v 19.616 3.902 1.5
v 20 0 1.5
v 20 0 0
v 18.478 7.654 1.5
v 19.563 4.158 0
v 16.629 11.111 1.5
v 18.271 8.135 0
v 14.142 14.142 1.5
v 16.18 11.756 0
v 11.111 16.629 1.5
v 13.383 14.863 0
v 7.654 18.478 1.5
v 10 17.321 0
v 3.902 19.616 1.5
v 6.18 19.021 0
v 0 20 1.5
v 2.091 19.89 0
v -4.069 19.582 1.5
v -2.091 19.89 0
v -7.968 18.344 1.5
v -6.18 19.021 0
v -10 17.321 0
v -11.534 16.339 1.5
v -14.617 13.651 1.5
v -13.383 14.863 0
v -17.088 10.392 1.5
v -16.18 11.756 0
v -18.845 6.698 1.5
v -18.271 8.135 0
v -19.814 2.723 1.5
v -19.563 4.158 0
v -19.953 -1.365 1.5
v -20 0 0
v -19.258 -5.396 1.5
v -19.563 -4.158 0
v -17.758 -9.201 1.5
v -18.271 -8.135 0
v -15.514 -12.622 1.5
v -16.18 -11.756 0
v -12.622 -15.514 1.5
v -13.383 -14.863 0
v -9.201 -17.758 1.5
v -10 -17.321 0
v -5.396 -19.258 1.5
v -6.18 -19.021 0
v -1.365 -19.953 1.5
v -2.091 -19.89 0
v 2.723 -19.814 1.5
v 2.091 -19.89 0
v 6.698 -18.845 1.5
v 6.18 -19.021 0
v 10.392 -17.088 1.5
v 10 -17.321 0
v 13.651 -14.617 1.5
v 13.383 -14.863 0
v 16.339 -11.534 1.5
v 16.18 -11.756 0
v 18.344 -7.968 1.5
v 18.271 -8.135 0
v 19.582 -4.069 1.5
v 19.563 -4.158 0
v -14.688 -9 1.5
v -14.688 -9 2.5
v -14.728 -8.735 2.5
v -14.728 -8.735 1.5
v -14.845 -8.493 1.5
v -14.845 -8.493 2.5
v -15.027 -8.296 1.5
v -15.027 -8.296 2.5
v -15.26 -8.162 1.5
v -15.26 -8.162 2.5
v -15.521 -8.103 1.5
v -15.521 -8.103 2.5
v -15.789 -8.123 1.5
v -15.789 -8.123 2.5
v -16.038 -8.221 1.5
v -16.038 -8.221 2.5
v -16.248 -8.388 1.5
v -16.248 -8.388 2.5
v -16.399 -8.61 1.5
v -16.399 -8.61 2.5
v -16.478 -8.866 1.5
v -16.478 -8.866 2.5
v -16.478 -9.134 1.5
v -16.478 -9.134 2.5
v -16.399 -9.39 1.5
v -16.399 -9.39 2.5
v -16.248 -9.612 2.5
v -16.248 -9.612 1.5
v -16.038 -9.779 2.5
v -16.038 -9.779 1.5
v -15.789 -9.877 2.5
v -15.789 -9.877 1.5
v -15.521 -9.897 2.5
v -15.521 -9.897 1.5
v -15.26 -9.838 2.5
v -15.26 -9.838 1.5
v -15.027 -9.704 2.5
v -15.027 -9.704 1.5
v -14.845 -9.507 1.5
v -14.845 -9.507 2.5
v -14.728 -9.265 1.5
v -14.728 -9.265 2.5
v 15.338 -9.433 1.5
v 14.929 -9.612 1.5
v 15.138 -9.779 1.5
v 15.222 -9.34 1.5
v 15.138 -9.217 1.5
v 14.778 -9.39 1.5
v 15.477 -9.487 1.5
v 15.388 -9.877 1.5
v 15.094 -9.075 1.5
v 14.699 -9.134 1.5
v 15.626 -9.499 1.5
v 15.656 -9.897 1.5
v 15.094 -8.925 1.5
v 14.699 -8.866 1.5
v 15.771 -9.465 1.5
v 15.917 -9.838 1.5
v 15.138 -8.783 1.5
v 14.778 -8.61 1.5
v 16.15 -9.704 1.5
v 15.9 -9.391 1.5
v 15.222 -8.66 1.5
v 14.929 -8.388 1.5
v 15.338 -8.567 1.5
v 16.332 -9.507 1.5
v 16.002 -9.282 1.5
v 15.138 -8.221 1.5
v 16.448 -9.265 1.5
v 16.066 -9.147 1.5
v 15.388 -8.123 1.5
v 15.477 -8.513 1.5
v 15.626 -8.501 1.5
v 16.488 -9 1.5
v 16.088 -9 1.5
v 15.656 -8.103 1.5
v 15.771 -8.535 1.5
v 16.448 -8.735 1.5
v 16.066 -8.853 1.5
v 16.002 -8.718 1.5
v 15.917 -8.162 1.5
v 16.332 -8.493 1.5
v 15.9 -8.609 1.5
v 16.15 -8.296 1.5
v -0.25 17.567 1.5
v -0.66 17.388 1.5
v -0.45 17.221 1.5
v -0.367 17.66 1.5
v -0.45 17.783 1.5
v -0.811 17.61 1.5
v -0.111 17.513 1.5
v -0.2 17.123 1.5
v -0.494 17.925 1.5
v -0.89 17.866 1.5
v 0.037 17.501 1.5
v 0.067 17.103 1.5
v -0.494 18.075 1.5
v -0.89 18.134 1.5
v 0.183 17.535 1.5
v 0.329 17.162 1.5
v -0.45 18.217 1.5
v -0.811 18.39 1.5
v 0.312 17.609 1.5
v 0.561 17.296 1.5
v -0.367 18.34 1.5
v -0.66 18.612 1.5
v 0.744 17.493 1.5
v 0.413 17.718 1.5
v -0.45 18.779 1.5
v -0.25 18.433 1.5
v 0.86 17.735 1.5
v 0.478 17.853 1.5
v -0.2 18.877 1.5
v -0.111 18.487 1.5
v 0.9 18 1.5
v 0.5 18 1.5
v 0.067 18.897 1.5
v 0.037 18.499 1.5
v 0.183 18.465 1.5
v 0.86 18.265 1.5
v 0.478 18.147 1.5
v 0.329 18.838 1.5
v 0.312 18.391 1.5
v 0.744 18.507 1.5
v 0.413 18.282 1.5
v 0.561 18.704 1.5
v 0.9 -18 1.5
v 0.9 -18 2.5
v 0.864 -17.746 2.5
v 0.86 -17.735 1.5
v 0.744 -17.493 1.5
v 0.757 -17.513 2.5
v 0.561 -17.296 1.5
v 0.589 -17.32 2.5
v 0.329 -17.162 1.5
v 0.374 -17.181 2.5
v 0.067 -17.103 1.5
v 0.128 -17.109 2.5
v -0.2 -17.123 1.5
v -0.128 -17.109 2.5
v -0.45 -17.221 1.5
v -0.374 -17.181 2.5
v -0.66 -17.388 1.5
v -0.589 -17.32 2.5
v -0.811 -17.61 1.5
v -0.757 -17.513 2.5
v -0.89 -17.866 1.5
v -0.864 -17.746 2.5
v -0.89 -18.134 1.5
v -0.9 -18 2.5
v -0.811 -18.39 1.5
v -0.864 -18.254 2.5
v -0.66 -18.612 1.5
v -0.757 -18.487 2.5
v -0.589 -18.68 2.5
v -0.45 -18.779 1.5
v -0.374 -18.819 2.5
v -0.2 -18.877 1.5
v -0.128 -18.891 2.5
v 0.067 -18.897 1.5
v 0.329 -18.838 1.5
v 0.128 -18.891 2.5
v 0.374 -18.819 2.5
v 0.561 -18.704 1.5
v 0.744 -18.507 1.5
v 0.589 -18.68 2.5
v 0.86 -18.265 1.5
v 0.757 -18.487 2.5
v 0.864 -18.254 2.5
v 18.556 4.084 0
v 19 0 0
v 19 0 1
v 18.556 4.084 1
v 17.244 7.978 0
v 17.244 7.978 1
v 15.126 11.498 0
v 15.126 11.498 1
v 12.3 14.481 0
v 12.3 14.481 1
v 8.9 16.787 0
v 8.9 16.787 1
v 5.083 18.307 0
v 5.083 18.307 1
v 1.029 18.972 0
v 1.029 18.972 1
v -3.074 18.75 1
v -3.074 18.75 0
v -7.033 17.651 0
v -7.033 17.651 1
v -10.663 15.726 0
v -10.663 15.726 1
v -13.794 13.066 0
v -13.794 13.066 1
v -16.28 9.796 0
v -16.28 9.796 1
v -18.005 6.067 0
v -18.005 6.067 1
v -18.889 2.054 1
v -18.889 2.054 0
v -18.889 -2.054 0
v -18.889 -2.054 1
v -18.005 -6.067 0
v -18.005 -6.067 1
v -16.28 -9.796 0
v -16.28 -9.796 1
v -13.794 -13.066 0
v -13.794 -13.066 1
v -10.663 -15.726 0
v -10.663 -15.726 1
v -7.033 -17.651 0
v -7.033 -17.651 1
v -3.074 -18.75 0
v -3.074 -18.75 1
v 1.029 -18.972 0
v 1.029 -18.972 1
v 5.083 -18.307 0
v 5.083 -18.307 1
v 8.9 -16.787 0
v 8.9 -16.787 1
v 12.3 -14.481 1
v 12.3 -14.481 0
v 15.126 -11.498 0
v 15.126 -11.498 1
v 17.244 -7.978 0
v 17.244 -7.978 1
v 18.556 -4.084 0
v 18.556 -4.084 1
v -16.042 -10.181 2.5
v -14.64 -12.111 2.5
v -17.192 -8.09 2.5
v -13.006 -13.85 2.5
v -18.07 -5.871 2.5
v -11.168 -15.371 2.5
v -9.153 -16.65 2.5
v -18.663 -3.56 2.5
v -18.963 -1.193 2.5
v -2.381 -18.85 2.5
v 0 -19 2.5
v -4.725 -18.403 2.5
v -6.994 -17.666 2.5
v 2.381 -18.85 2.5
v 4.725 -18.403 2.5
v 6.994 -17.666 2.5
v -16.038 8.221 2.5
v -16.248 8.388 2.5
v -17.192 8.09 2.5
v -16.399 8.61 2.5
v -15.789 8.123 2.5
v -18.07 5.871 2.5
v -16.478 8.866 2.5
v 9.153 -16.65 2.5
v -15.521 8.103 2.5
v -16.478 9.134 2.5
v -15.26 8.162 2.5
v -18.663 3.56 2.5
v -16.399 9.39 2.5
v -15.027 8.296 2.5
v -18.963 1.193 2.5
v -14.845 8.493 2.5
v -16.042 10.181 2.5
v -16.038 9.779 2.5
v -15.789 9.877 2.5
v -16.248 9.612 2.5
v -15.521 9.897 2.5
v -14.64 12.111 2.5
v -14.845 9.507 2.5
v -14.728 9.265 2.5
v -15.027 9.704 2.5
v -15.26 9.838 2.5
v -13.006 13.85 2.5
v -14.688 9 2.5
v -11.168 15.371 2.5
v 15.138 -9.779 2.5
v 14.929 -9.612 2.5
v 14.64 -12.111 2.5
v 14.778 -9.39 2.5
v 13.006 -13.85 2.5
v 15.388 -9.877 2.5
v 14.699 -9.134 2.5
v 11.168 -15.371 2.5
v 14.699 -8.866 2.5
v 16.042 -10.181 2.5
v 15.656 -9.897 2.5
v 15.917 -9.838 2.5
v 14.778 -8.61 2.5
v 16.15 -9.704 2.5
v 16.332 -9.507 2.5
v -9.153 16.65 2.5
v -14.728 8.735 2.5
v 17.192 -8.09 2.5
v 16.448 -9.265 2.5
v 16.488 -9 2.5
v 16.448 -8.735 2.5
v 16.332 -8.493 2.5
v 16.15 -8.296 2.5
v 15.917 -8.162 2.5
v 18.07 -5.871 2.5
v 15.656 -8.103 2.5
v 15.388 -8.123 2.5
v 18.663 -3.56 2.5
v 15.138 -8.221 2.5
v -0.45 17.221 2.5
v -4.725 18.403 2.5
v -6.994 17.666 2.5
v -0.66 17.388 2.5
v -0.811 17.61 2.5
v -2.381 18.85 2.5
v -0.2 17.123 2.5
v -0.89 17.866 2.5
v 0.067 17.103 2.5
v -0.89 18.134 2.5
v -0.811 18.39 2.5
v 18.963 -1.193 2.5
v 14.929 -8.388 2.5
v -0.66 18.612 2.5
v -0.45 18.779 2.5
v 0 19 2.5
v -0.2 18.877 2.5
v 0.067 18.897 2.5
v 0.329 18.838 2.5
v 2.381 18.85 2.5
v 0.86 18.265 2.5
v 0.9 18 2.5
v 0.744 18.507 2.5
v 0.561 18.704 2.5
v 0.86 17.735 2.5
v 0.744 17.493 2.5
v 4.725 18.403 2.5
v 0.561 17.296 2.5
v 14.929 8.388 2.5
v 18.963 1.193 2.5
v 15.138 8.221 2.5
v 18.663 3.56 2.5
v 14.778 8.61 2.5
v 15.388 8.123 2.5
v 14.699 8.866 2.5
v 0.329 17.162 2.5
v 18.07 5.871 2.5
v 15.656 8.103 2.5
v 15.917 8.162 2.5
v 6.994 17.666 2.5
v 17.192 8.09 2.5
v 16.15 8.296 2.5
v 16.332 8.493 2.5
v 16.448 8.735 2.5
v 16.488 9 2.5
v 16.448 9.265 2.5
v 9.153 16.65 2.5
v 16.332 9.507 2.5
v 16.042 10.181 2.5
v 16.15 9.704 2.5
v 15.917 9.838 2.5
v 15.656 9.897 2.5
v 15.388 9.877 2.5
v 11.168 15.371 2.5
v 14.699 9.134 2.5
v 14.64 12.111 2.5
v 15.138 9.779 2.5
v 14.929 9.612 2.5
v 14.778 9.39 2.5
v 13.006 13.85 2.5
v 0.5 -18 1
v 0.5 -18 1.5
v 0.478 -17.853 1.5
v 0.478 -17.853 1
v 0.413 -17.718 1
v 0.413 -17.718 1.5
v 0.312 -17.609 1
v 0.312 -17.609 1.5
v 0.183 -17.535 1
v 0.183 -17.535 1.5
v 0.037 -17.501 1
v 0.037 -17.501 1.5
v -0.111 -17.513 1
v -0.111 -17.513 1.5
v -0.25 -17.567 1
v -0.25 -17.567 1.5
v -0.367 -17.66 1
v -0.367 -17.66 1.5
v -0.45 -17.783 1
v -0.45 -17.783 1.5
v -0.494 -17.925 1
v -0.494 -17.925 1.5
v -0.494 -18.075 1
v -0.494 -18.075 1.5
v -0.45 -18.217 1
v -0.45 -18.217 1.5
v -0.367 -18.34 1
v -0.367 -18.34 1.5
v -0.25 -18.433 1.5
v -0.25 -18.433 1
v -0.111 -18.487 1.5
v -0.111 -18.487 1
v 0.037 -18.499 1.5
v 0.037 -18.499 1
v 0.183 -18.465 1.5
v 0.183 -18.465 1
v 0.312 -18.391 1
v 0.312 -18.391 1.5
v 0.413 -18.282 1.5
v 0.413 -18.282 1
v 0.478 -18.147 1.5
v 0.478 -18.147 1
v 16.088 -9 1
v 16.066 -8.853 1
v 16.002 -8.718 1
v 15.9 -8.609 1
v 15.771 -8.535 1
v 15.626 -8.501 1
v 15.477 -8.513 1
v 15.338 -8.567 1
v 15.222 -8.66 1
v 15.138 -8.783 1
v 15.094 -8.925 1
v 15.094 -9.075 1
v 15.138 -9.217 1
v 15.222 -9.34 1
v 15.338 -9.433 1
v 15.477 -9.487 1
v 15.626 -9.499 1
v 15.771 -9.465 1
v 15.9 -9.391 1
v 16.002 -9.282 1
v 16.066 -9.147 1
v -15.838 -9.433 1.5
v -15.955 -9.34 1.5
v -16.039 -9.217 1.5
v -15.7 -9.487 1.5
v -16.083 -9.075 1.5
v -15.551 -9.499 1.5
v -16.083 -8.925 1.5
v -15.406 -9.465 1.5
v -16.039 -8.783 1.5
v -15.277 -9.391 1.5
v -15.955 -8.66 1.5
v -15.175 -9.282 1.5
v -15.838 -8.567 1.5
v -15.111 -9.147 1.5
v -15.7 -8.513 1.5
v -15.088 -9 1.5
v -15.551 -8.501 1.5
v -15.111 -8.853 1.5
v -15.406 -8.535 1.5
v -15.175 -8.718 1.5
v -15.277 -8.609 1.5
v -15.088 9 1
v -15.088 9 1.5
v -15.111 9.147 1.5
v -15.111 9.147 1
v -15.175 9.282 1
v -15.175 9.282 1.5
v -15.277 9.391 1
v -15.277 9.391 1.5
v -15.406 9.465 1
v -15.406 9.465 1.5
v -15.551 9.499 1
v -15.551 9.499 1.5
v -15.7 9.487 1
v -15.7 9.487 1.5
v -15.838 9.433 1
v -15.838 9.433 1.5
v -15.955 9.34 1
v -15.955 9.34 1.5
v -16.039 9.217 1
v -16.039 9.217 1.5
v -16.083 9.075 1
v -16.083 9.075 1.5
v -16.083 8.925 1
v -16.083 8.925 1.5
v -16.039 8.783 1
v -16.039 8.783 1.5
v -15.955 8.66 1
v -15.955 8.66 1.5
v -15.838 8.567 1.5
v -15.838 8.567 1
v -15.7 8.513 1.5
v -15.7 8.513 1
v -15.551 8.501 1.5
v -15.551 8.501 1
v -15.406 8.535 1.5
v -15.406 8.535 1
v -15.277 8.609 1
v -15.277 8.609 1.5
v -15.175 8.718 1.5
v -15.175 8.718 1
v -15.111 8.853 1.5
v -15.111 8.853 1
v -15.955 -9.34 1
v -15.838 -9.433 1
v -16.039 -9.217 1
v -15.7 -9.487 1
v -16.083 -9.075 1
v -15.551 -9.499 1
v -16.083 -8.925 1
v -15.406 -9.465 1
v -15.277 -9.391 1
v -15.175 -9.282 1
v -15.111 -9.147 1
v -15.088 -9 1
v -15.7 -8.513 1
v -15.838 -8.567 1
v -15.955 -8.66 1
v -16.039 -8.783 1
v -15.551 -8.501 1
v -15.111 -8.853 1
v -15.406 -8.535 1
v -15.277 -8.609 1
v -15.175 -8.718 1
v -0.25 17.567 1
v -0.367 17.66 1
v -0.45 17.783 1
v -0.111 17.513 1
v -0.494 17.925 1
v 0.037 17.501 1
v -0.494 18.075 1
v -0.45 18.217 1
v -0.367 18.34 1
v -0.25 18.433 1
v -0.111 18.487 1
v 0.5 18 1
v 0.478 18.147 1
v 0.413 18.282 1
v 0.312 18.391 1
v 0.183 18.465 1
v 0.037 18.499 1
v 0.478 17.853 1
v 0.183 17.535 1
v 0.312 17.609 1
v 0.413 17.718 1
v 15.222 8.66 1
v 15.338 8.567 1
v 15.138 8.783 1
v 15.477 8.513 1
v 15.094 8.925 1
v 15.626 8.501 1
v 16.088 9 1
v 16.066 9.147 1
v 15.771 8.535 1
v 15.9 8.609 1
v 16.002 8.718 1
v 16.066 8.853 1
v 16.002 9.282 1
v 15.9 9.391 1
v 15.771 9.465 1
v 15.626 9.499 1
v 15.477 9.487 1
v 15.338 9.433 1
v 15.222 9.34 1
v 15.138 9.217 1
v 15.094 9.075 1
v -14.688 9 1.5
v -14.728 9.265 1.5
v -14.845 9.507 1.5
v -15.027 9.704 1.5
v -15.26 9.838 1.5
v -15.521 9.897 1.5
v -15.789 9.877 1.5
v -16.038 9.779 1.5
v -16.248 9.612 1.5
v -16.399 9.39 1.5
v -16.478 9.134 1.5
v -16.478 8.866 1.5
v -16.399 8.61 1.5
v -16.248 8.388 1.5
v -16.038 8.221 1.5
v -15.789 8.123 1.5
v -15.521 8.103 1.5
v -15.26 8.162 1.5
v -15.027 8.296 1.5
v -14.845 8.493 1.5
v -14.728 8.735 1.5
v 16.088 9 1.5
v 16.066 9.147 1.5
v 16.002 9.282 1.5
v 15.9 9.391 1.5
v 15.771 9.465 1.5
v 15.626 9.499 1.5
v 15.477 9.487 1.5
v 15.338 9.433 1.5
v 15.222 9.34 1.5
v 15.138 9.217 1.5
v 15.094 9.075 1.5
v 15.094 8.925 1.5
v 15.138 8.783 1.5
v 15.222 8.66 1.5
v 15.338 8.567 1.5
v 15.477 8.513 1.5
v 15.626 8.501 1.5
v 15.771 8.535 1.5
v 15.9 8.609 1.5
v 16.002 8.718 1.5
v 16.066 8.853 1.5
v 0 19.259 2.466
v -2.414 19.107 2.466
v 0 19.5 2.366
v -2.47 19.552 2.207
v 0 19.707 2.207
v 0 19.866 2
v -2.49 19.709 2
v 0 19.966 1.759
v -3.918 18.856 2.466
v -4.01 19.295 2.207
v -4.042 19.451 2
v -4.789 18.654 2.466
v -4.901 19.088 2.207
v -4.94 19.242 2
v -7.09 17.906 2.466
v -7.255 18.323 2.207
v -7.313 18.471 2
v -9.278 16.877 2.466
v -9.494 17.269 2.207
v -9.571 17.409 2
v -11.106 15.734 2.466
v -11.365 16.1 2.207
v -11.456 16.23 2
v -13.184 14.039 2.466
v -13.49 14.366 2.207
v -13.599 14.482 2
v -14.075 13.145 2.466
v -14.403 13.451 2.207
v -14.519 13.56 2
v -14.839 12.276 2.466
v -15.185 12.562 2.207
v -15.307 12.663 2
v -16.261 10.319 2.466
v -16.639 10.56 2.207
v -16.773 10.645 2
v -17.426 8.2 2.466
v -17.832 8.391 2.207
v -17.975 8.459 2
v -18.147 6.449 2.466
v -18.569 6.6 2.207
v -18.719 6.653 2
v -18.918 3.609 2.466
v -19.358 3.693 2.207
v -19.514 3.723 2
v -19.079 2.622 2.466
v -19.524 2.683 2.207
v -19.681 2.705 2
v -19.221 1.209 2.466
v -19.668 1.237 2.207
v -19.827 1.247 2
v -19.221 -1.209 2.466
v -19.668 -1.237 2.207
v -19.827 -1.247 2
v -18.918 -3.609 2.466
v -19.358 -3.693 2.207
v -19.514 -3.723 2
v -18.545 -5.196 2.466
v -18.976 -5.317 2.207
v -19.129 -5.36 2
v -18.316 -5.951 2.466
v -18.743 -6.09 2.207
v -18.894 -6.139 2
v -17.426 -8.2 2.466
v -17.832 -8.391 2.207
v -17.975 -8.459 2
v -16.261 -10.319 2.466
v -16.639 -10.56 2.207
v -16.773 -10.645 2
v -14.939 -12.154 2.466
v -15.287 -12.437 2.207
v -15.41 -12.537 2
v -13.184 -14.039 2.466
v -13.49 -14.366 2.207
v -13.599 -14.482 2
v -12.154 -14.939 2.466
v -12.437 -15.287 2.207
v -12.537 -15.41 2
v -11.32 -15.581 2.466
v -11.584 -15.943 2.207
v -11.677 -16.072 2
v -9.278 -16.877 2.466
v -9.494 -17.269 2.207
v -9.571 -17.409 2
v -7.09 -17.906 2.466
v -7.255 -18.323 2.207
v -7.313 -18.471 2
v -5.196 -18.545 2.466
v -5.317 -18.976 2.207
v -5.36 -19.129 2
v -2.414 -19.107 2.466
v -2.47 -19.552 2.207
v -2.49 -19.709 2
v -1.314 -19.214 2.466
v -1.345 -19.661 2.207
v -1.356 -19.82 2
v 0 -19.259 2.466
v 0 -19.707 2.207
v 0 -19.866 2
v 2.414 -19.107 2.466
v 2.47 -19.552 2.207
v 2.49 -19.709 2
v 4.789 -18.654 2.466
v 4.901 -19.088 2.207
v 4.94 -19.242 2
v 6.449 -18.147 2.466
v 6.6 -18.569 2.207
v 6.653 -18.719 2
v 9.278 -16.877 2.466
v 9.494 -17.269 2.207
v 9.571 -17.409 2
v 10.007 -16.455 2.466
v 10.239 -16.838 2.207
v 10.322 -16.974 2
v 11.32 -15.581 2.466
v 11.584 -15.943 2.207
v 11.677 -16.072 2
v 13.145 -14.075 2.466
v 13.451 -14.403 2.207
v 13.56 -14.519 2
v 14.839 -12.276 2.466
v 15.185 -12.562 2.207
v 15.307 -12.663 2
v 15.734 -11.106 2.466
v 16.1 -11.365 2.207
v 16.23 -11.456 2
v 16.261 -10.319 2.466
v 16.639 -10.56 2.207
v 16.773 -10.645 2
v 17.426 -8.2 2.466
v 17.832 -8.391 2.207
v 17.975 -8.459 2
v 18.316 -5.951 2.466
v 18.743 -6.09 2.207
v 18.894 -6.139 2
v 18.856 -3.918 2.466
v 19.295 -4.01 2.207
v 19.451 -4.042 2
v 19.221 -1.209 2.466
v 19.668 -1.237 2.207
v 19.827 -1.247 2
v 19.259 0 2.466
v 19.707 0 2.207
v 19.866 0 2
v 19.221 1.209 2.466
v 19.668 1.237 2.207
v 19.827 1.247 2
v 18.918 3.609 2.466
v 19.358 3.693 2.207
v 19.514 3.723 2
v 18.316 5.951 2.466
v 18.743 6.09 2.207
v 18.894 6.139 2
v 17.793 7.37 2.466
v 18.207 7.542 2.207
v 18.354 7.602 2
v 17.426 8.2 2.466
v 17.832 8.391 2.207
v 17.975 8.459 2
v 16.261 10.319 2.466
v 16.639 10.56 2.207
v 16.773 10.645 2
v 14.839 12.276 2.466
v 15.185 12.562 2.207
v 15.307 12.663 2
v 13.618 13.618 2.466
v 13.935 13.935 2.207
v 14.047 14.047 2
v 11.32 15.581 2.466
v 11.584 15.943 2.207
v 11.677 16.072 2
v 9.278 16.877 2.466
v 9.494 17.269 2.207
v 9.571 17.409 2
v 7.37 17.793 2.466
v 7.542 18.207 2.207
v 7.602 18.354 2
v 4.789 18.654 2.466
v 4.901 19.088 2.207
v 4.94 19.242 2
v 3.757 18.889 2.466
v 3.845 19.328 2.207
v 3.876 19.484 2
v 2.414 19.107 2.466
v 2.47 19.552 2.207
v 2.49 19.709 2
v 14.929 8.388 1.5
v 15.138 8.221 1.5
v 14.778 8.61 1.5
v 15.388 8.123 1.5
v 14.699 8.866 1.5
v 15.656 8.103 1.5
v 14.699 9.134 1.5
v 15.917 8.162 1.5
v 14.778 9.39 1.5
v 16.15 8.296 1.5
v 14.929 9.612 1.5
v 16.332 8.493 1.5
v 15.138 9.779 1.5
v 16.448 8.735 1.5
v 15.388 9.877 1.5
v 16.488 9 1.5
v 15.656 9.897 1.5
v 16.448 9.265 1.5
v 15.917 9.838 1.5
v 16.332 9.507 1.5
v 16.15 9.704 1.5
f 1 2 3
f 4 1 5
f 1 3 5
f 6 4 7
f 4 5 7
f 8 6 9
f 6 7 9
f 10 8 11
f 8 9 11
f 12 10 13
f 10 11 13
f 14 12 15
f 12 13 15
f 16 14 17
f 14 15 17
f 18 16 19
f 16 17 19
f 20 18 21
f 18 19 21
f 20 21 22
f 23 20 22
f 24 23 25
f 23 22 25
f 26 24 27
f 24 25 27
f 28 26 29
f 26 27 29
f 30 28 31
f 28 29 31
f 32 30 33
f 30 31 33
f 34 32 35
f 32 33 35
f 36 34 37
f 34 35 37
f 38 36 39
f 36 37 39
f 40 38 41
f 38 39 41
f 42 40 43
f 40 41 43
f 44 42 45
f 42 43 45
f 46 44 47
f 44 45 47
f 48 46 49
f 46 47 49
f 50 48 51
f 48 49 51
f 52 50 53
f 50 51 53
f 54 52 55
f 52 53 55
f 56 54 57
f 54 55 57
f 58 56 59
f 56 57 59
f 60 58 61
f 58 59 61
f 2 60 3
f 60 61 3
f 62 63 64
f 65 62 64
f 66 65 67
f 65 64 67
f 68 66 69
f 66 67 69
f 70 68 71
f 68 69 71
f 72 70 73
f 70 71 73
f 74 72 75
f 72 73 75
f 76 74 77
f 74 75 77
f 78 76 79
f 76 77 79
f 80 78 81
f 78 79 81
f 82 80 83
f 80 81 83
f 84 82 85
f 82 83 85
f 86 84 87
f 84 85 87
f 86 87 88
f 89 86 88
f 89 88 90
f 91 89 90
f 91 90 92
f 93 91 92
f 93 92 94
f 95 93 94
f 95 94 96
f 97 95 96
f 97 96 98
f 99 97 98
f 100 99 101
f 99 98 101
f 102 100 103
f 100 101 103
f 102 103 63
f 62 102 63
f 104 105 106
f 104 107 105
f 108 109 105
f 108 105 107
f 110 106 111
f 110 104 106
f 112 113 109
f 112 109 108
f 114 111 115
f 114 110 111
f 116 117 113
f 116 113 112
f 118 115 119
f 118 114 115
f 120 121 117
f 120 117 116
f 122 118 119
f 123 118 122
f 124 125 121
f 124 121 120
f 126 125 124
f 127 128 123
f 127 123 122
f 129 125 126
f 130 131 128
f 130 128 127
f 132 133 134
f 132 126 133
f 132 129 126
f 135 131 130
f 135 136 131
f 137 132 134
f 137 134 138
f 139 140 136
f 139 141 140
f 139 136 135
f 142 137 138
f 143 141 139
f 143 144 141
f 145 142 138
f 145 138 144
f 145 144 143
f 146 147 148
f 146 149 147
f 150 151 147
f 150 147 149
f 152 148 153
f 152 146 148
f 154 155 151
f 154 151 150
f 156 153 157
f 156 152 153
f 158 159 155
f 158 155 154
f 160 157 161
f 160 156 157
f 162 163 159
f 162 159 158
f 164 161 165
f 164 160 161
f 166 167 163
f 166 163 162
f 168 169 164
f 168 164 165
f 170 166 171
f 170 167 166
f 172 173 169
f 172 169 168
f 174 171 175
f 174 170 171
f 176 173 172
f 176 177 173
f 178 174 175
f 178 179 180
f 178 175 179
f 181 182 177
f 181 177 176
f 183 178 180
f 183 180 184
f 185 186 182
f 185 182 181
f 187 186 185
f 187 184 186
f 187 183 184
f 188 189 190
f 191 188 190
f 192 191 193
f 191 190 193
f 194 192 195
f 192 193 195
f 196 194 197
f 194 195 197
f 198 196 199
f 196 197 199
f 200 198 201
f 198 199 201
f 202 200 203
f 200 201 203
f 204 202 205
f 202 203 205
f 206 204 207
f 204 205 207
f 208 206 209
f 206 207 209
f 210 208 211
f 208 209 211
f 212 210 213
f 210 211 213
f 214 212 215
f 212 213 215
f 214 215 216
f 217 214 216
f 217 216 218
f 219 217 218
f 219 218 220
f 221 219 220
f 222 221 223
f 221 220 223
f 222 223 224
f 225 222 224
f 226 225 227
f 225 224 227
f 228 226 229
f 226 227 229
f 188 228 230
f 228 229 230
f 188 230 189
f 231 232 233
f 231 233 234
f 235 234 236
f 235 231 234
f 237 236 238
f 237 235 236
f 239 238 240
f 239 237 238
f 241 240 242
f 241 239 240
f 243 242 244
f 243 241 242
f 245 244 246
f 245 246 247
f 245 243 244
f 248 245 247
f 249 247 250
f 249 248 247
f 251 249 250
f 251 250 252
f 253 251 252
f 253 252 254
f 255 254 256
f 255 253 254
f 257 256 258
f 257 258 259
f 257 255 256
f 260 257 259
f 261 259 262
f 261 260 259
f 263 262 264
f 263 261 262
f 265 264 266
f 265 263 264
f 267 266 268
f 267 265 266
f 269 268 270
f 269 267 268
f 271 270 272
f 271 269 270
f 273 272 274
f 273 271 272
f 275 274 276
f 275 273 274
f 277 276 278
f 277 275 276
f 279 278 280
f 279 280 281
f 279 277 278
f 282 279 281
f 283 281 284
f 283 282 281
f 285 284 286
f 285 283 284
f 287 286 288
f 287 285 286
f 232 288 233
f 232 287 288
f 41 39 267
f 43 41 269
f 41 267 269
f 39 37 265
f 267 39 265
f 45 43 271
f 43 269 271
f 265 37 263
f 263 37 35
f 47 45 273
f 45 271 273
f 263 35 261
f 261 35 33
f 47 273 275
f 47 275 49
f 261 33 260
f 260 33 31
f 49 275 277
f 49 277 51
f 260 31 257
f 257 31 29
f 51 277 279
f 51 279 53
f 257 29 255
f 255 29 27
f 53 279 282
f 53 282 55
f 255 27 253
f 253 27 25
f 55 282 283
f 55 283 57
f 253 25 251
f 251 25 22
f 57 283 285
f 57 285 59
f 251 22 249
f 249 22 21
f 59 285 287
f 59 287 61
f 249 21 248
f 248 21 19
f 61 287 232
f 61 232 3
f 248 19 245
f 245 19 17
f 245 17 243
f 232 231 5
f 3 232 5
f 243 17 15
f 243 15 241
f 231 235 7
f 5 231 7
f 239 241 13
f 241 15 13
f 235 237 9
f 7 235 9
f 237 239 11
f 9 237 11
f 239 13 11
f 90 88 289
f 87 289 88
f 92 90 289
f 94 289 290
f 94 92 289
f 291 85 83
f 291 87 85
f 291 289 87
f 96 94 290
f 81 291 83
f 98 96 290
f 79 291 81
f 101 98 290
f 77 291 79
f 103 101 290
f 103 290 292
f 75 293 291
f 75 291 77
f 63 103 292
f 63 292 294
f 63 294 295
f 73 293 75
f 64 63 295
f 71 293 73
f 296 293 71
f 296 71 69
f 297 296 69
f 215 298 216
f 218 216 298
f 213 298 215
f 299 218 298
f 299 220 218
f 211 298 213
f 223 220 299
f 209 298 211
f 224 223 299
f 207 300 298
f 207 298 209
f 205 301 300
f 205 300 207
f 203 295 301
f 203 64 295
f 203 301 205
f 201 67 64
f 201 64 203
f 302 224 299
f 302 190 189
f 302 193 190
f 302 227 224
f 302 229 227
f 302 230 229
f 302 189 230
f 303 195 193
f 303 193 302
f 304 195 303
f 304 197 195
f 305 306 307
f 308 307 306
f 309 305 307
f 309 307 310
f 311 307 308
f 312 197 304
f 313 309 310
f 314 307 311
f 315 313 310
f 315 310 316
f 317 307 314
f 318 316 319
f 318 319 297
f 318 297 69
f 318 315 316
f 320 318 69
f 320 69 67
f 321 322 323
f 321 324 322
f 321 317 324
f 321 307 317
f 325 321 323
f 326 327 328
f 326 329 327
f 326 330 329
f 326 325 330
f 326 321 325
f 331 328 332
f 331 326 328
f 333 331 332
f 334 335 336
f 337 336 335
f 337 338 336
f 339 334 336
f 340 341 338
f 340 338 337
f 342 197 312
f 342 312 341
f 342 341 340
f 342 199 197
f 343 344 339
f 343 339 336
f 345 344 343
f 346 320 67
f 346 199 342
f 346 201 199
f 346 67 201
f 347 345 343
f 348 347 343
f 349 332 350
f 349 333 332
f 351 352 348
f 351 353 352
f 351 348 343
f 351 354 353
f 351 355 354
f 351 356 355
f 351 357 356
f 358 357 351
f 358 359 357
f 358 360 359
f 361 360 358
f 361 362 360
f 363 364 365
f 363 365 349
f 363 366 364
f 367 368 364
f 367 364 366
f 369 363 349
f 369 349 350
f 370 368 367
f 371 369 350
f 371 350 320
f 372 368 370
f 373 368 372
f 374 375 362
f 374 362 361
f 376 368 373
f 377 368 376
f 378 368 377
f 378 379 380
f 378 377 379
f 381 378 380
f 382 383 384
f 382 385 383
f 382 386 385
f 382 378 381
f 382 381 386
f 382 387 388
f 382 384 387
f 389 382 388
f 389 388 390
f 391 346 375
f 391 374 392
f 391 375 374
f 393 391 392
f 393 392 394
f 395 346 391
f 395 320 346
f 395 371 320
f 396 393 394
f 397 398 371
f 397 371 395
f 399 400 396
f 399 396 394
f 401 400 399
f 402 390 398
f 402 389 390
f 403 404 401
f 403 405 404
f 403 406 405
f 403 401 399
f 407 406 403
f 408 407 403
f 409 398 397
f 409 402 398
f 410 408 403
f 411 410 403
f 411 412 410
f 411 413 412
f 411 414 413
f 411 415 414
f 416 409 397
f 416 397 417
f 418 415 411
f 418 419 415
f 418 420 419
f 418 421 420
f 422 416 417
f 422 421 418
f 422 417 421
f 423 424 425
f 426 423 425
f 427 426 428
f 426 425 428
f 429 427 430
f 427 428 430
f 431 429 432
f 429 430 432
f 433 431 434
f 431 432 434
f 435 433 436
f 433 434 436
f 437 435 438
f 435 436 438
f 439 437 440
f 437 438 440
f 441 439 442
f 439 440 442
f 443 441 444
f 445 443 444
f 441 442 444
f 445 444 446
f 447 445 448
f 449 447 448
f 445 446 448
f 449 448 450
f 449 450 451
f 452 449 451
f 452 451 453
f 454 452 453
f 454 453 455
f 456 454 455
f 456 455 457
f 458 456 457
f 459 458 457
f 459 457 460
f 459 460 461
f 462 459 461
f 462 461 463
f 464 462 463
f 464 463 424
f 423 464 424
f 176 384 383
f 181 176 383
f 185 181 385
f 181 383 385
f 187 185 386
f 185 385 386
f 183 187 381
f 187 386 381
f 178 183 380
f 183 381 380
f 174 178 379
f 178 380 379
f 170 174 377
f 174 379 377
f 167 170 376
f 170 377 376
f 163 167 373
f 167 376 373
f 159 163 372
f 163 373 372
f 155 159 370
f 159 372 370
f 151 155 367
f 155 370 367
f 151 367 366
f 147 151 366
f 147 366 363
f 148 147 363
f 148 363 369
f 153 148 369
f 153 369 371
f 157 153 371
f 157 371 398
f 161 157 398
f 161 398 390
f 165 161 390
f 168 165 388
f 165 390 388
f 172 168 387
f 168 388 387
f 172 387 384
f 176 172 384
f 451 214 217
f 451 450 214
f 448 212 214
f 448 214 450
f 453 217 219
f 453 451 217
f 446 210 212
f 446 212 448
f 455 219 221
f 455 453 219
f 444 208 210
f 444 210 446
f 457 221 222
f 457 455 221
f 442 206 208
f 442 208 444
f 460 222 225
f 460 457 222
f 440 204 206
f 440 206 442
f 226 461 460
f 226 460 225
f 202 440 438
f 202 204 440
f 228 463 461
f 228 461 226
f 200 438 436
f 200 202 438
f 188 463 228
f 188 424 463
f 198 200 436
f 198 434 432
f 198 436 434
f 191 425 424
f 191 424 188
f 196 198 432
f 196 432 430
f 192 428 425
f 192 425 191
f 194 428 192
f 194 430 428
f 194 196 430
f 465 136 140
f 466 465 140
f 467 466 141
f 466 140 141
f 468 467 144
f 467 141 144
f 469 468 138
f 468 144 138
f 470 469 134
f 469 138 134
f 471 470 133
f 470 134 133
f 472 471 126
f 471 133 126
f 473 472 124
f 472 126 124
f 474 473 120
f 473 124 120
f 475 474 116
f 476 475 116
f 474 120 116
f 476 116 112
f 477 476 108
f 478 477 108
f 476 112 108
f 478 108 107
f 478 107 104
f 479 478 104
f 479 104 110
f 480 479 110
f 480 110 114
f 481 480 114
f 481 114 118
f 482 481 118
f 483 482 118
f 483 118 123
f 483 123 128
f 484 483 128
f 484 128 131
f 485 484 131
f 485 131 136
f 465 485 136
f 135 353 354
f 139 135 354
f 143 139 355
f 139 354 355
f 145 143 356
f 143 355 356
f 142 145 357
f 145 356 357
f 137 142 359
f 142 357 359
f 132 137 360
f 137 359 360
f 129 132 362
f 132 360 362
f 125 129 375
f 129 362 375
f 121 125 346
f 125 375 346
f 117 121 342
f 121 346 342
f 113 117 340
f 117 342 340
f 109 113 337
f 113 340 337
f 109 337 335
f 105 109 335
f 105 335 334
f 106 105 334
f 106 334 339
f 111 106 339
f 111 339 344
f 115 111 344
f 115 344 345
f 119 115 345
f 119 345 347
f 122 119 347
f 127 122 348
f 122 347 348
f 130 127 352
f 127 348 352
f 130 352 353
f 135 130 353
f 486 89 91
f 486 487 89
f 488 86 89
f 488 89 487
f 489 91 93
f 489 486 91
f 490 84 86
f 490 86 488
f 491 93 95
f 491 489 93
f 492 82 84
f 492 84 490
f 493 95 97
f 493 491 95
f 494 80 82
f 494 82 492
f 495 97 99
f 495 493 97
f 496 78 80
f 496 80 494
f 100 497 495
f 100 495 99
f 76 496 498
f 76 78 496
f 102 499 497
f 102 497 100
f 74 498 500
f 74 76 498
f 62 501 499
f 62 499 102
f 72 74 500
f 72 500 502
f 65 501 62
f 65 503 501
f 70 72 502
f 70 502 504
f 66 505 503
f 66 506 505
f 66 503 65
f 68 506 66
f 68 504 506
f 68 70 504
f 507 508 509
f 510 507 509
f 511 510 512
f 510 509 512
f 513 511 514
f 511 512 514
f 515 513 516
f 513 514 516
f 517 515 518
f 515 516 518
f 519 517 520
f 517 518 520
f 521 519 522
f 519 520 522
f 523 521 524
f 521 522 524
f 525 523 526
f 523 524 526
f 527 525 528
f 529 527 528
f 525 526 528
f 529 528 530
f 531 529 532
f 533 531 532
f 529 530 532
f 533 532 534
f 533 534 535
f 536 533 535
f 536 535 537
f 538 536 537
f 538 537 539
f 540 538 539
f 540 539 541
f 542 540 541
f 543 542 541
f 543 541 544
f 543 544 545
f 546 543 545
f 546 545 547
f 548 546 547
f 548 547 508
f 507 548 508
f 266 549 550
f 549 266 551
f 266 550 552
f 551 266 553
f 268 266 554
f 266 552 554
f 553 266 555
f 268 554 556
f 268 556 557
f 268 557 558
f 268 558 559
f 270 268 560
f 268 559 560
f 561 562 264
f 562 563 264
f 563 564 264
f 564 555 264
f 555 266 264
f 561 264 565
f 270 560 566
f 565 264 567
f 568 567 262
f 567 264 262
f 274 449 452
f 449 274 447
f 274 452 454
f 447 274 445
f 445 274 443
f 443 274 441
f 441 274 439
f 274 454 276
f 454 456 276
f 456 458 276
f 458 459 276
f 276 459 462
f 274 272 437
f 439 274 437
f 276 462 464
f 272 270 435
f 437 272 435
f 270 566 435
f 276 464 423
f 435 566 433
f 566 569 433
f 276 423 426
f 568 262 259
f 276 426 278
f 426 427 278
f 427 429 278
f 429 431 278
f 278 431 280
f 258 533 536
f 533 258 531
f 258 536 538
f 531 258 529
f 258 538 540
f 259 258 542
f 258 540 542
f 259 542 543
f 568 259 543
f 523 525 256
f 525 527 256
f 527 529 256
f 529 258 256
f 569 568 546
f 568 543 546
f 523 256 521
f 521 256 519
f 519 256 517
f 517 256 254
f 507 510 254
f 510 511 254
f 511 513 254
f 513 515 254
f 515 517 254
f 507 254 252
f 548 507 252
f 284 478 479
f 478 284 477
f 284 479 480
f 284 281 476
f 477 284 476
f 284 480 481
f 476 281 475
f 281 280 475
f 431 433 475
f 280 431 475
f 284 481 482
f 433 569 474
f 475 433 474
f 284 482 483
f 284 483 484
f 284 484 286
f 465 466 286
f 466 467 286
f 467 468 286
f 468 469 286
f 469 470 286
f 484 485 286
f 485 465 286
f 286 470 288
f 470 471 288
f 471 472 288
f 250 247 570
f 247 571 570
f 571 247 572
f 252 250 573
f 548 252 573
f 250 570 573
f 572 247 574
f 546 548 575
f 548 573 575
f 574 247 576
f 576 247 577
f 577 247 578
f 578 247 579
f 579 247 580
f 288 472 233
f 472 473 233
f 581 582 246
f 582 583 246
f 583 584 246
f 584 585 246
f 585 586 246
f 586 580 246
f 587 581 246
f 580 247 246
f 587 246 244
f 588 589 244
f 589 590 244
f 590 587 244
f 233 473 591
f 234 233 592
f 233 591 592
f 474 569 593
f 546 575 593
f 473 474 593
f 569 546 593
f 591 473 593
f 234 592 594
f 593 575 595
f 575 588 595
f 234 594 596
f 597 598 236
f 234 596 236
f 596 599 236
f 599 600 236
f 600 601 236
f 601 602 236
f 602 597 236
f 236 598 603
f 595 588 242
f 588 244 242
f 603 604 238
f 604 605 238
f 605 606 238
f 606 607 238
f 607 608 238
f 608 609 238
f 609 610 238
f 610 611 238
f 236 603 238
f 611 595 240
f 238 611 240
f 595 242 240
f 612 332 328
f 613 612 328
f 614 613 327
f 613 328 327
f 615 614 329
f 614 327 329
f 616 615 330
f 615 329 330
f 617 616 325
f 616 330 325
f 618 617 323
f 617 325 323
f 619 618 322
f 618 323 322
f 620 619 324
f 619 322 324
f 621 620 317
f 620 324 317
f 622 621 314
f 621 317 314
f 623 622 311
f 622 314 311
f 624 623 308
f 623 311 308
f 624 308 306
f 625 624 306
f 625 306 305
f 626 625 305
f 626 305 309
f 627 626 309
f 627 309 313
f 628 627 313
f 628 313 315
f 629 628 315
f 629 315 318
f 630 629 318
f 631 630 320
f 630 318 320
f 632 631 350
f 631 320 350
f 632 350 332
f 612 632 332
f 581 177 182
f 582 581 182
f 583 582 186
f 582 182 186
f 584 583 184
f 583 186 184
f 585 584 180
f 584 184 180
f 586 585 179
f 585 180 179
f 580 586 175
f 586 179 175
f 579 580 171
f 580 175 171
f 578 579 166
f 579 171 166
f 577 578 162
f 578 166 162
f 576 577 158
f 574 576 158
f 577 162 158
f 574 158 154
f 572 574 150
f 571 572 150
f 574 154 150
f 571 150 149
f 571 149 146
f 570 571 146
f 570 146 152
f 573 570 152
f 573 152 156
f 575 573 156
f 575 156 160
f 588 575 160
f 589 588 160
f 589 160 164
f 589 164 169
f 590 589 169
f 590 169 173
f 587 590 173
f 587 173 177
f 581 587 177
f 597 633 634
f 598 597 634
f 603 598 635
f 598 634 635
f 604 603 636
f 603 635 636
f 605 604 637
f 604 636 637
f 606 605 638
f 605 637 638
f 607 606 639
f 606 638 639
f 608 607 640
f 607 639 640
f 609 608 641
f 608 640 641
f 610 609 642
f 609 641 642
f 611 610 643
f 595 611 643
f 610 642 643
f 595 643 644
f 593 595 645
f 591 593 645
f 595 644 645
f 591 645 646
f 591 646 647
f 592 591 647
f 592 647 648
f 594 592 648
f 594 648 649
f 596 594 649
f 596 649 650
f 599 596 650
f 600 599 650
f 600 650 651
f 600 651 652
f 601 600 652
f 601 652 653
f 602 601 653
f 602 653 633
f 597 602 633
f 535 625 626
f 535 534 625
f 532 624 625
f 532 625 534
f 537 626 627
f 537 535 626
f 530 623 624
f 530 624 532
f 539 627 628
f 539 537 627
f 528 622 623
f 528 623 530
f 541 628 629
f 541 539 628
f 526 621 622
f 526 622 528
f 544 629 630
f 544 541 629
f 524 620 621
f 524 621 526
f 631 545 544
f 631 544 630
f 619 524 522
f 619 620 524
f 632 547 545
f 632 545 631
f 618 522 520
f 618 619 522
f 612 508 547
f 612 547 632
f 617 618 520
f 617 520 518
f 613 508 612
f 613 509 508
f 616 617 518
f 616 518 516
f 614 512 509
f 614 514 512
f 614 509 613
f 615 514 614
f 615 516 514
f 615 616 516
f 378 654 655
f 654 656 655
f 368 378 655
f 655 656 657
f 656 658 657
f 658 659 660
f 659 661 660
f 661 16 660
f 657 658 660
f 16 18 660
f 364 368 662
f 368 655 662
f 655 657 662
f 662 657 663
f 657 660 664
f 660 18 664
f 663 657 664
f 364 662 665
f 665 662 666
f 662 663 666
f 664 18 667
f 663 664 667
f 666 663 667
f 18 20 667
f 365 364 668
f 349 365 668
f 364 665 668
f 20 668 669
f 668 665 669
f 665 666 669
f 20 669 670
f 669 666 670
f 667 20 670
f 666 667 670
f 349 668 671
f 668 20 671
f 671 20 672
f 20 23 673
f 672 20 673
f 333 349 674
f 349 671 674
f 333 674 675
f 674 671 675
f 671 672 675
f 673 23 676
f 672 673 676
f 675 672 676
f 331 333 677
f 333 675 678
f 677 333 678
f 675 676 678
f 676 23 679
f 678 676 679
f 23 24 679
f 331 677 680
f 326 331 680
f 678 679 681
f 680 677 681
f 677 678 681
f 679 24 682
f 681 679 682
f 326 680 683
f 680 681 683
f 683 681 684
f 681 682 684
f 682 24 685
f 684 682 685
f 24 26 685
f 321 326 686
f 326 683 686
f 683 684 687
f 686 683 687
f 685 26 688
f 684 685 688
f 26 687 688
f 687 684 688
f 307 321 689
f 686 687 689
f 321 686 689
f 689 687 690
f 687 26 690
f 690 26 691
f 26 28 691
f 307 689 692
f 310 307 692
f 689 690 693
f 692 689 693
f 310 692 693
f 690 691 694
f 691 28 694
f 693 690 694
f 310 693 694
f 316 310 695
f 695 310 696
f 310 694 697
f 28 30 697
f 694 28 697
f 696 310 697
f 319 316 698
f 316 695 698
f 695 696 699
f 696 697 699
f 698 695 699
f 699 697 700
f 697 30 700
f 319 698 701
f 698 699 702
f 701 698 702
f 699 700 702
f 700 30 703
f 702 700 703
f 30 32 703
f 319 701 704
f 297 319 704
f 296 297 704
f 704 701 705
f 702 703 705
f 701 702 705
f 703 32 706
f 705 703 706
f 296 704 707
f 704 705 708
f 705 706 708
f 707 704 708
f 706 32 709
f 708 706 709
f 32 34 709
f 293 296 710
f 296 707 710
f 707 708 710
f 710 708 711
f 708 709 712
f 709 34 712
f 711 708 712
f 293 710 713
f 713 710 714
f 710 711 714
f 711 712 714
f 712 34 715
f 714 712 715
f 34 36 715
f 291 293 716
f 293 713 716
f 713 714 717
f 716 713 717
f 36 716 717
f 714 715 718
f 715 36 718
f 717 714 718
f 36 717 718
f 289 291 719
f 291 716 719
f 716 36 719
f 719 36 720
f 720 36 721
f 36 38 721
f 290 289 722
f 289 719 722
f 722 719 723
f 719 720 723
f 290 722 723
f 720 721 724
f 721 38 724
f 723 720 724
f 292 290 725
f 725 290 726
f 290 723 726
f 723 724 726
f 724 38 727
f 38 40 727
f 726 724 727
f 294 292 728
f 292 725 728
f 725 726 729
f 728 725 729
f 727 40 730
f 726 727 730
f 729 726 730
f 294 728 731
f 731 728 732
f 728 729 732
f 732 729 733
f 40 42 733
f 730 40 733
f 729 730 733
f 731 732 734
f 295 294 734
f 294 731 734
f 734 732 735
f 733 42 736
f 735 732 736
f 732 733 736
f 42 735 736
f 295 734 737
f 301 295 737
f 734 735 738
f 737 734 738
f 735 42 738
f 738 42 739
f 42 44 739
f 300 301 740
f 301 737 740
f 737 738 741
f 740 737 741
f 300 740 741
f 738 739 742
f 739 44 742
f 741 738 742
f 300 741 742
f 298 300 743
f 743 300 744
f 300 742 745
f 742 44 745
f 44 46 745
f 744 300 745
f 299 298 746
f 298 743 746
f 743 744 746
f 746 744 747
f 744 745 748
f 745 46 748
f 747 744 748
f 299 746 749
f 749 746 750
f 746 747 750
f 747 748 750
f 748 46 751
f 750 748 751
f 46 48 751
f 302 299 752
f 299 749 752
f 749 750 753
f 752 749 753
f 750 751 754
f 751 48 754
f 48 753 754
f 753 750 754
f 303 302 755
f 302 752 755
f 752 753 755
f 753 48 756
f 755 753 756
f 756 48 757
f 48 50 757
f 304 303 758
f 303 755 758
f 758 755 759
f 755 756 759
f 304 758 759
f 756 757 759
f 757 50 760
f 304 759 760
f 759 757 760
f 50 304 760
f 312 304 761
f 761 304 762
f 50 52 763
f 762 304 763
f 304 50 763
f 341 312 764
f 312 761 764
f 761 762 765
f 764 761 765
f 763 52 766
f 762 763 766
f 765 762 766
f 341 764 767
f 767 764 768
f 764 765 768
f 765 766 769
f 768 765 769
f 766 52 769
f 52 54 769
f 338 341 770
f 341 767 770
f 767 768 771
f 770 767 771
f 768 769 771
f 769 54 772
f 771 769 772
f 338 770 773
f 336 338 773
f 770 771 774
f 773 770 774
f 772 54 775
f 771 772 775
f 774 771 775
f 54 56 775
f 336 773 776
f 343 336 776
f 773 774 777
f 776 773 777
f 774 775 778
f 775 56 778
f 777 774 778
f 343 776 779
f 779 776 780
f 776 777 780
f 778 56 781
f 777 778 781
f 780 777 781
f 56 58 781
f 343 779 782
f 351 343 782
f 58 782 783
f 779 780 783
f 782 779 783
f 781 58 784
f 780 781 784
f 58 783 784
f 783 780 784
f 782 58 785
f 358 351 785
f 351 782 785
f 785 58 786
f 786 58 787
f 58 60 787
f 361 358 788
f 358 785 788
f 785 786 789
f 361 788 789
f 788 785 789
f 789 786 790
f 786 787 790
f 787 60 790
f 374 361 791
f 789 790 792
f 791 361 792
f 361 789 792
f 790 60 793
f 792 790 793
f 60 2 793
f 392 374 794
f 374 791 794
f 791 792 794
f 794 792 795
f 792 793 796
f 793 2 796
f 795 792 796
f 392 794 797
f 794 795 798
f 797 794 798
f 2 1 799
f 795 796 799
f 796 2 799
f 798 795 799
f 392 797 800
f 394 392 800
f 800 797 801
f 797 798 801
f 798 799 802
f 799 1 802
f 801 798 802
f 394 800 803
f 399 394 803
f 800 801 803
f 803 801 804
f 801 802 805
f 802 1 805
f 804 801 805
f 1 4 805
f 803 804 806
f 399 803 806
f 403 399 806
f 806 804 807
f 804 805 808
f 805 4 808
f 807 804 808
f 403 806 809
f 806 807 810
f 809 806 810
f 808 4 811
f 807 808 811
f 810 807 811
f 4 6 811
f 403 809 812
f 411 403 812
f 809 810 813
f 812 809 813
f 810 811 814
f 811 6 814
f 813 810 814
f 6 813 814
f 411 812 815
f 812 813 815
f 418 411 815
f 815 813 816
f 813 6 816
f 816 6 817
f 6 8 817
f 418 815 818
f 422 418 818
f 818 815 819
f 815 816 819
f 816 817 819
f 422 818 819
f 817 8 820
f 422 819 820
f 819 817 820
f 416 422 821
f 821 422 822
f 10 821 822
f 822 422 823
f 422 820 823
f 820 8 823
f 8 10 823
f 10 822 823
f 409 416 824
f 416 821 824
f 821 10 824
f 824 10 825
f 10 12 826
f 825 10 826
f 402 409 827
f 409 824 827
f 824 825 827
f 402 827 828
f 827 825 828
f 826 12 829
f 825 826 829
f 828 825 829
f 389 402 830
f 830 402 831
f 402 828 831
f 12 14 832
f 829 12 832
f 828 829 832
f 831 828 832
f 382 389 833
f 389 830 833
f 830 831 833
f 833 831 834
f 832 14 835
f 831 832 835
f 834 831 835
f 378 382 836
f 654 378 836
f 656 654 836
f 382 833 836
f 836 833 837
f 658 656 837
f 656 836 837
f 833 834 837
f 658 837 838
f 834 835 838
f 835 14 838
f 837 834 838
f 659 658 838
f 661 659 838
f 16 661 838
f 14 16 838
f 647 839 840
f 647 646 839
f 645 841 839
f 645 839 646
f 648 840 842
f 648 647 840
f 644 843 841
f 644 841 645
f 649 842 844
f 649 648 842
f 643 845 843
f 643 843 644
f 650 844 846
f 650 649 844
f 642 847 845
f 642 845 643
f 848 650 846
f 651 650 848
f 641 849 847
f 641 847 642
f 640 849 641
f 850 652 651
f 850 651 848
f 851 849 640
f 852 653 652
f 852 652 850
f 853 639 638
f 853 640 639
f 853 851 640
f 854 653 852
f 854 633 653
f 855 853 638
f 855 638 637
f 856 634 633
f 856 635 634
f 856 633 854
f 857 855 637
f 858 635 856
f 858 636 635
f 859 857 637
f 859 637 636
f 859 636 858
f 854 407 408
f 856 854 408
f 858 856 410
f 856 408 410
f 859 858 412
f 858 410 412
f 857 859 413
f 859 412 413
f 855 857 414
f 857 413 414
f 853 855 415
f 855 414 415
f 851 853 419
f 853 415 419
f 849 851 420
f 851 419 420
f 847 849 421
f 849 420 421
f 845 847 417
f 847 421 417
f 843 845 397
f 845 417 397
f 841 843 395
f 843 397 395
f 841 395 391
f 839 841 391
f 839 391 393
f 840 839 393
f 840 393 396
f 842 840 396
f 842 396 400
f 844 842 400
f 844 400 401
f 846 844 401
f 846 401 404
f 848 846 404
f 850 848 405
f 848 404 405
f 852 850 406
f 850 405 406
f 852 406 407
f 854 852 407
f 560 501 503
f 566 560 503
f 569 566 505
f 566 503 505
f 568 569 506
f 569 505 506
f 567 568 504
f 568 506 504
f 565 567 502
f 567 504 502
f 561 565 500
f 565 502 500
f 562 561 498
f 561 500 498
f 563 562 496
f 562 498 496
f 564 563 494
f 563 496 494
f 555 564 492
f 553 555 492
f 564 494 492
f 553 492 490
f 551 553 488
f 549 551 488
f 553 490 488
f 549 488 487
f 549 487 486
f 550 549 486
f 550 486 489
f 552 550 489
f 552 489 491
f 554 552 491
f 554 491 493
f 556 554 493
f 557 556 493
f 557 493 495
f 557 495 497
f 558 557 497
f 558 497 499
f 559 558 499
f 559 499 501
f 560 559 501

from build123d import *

# Parameters (mm, degrees)
F0_R     = 20
F0_R_2   = 19
F1_DEPTH = 1
F2_R     = 20
F3_DEPTH = 1.5
F4_R     = 0.5
F5_DEPTH = 2.501
F6_R     = 0.9
F7_DEPTH = 1


with BuildPart() as f1:
    # F0 (on Top) → F1 (new body)
    with BuildSketch(Plane.XY):
        Circle(F0_R)
        Circle(F0_R_2, mode=Mode.SUBTRACT)
    extrude(amount=F1_DEPTH)

    # F2 (on face) → F3 (join)
    with BuildSketch(Plane.XY.offset(1)):
        Circle(F2_R)
    extrude(amount=F3_DEPTH)

    # F4 (on face) → F5 (cut, through all)
    with BuildSketch(Plane.XY.offset(2.5)):
        with Locations((0, 18)):
            Circle(F4_R)
        with Locations((15.5884572681, 9)):
            Circle(F4_R)
        with Locations((15.5884572681, -9)):
            Circle(F4_R)
        with Locations((0, -18)):
            Circle(F4_R)
        with Locations((-15.5884572681, -9)):
            Circle(F4_R)
        with Locations((-15.5884572681, 9)):
            Circle(F4_R)
    extrude(amount=-F5_DEPTH, mode=Mode.SUBTRACT)

    # F6 (on face) → F7 (cut)
    with BuildSketch(Plane.XY.offset(2.5)):
        with Locations((0, 18)):
            Circle(F6_R)
        with Locations((-15.5884572681, 9)):
            Circle(F6_R)
        with Locations((-15.5884572681, -9)):
            Circle(F6_R)
        with Locations((0, -18)):
            Circle(F6_R)
        with Locations((15.5884572681, -9)):
            Circle(F6_R)
        with Locations((15.5884572681, 9)):
            Circle(F6_R)
    extrude(amount=-F7_DEPTH, mode=Mode.SUBTRACT)

    # F8 (on Right) → F9 (revolve, cut)
    with BuildSketch(Plane.YZ):
        with BuildLine():
            Line((20, 1.5), (20, 2.5))
            Line((20, 2.5), (19, 2.5))
            ThreePointArc((19, 2.5), (19.7071067812, 2.2071067812), (20, 1.5))
        make_face()
    revolve(axis=Axis((0, 0, 3.847687738), (0, 0, 1)), mode=Mode.SUBTRACT)


solid = f1.part
